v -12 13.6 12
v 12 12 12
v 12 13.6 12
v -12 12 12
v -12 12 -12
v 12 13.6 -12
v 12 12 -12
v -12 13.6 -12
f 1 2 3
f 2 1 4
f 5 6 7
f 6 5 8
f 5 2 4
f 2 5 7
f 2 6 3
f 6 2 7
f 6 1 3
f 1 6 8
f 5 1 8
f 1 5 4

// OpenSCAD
translate([-12,12,-12])//we can use negative values only in translate function not in other like cube or sphere.
scale([3,0.2,3])
cube(8,0,12);
